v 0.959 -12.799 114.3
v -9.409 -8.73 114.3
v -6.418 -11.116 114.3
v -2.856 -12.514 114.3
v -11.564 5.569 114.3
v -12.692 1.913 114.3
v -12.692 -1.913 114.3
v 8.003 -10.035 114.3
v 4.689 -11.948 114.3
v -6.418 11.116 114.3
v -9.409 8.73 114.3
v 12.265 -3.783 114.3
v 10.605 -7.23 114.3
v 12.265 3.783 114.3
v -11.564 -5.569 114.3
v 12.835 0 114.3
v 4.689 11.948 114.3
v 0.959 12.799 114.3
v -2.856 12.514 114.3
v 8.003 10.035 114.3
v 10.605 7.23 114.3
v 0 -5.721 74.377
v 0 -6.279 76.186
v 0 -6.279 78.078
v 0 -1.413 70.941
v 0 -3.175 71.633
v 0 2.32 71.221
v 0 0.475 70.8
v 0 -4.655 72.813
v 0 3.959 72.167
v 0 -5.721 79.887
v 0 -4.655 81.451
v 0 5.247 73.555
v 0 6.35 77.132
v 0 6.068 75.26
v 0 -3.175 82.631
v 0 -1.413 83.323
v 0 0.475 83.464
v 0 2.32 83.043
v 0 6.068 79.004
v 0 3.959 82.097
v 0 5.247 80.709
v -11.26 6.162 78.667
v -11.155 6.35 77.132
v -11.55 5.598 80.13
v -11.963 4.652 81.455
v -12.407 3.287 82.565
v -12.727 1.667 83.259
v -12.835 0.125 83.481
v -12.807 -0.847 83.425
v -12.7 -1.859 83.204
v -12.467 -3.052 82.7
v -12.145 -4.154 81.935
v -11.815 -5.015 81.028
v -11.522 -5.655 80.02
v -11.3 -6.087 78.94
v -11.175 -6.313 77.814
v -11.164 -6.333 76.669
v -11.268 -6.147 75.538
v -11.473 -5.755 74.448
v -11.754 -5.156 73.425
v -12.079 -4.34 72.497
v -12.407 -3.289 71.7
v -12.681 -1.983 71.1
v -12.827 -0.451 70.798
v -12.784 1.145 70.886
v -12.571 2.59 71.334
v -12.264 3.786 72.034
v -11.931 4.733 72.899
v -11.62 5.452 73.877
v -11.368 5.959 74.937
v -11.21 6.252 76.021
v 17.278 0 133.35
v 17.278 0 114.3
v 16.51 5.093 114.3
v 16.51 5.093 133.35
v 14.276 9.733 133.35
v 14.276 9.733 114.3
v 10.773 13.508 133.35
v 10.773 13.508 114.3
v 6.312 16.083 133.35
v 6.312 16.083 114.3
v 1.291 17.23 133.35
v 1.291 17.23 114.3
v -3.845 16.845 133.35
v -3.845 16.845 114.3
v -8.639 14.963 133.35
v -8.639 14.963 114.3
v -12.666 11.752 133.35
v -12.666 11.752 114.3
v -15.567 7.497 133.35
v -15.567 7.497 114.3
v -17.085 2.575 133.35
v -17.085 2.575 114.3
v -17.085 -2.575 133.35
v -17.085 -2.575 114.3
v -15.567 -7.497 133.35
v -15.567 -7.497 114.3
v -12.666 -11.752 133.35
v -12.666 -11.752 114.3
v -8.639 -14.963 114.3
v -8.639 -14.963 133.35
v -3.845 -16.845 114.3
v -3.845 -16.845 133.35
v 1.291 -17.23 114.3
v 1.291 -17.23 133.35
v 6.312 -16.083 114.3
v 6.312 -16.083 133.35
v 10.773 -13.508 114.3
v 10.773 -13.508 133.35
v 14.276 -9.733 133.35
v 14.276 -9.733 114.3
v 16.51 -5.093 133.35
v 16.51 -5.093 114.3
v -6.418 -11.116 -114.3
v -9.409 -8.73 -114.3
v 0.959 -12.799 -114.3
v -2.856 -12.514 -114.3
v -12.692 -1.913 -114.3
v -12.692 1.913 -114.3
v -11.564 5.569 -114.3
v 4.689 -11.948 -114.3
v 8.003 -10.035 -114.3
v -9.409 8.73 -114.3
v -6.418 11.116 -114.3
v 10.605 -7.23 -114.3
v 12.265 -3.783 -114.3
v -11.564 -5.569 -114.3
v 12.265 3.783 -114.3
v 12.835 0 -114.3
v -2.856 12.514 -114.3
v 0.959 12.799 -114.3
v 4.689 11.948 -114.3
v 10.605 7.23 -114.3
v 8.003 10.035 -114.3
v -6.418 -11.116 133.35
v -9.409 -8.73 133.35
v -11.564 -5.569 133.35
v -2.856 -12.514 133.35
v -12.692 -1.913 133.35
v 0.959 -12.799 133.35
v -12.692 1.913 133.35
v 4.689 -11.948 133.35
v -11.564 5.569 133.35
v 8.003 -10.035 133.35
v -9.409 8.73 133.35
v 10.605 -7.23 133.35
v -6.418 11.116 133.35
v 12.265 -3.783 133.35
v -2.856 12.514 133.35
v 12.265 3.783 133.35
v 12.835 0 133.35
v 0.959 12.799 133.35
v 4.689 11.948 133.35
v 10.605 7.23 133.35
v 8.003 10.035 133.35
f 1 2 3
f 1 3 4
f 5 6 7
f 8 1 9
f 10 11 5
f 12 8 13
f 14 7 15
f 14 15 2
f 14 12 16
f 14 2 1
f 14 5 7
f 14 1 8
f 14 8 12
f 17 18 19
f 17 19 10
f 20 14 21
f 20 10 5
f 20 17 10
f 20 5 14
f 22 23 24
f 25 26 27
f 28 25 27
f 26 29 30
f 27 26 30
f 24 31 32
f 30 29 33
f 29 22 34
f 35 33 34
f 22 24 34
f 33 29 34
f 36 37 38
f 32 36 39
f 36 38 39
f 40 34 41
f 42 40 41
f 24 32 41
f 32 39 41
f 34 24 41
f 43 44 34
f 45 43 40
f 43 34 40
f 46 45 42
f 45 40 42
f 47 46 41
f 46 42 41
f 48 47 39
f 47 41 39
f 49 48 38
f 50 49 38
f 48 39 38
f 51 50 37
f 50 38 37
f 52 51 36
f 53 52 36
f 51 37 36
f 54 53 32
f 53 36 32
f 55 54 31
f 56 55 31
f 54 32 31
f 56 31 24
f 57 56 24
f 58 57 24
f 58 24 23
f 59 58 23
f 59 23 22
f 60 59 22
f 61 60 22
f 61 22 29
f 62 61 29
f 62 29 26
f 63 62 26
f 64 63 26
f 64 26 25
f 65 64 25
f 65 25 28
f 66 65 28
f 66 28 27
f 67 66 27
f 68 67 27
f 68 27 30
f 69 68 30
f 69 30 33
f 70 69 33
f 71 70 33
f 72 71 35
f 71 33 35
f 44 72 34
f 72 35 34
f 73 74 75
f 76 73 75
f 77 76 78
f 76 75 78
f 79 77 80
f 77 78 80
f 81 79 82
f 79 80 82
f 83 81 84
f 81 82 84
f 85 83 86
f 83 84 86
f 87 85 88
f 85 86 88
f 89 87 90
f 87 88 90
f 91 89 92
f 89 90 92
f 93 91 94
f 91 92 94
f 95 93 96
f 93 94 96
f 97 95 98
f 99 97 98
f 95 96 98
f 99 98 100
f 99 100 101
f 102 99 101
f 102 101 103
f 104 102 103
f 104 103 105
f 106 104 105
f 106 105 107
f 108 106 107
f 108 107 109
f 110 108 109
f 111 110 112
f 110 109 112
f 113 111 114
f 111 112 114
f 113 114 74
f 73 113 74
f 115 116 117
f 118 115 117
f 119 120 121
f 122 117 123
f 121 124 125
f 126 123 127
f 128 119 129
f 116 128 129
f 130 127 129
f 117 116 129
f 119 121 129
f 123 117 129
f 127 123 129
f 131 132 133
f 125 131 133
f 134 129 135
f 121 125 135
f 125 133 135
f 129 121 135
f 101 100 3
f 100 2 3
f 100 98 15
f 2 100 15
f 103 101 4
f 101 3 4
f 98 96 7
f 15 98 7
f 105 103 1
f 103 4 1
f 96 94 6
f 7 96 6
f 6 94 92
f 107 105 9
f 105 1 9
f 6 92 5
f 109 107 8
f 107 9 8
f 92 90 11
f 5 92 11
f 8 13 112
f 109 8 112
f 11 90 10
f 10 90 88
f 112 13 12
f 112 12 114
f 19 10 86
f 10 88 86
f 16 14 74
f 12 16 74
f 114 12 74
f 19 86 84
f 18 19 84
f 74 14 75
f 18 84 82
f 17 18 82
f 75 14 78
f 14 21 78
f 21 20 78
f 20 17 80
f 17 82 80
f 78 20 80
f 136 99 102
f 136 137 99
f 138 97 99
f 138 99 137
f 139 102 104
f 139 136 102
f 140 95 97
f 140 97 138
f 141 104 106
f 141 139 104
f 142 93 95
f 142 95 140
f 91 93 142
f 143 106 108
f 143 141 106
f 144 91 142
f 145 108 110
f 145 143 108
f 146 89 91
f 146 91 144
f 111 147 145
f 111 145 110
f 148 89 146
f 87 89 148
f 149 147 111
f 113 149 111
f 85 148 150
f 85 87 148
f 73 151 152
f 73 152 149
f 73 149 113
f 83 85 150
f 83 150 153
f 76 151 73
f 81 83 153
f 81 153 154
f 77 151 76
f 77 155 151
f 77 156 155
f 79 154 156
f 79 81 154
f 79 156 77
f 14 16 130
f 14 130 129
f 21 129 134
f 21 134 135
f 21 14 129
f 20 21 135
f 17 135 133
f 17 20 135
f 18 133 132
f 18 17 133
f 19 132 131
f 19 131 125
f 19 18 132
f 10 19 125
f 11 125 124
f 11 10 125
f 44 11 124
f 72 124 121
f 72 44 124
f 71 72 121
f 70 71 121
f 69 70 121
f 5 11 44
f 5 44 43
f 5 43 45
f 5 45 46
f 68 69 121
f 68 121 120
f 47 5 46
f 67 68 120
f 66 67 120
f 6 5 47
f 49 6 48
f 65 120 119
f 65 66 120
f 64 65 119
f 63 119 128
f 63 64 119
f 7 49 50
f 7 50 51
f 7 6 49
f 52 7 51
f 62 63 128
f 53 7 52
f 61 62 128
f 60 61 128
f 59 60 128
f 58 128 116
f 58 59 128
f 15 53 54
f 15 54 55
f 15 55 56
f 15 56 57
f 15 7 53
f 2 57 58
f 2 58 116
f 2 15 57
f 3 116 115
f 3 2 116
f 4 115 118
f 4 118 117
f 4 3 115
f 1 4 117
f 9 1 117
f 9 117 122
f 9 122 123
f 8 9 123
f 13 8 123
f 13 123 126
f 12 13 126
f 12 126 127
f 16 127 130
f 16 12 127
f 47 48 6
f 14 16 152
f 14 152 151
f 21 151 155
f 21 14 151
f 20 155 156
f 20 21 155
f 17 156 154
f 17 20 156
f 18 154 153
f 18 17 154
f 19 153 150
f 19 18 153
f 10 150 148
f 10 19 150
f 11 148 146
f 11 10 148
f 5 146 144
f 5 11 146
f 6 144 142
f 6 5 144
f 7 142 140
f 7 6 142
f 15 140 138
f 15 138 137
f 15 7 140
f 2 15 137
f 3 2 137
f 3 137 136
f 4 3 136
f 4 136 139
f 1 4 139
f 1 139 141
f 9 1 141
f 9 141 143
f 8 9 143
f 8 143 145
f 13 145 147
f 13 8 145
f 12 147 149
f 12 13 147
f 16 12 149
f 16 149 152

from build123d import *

# Parameters (mm, degrees)
F0_R     = 12.835341098
F1_DEPTH = 114.3
F3_R     = 17.2778356716
F3_R_2   = 12.835341098
F4_DEPTH = 19.05
F5_D     = 12.7
F5_DEPTH = 50.8
F5_TIP   = 3.8154649308


with BuildPart() as f1:
    # F0 (on Top) → F1 (new body, symmetric)
    with BuildSketch(Plane.XY):
        Circle(F0_R)
    extrude(amount=F1_DEPTH, both=True)

    # F5 (one way)
    with BuildSketch(Plane.YZ):
        with Locations((0, 77.132076025)):
            Circle(F5_D / 2)
    extrude(amount=-F5_DEPTH, mode=Mode.SUBTRACT)
    with Locations(Plane.YZ):
        with Locations((0, 77.132076025)):
            with Locations((0, 0, -(F5_DEPTH + F5_TIP / 2))):  # 118° drill point
                Cone(0, F5_D / 2, F5_TIP, mode=Mode.SUBTRACT)


with BuildPart() as f4:
    # F3 (on face) → F4 (new body)
    with BuildSketch(Plane.XY.offset(114.3)):
        Circle(F3_R)
        Circle(F3_R_2, mode=Mode.SUBTRACT)
    extrude(amount=F4_DEPTH)


solid = Compound([f1.part, f4.part])
